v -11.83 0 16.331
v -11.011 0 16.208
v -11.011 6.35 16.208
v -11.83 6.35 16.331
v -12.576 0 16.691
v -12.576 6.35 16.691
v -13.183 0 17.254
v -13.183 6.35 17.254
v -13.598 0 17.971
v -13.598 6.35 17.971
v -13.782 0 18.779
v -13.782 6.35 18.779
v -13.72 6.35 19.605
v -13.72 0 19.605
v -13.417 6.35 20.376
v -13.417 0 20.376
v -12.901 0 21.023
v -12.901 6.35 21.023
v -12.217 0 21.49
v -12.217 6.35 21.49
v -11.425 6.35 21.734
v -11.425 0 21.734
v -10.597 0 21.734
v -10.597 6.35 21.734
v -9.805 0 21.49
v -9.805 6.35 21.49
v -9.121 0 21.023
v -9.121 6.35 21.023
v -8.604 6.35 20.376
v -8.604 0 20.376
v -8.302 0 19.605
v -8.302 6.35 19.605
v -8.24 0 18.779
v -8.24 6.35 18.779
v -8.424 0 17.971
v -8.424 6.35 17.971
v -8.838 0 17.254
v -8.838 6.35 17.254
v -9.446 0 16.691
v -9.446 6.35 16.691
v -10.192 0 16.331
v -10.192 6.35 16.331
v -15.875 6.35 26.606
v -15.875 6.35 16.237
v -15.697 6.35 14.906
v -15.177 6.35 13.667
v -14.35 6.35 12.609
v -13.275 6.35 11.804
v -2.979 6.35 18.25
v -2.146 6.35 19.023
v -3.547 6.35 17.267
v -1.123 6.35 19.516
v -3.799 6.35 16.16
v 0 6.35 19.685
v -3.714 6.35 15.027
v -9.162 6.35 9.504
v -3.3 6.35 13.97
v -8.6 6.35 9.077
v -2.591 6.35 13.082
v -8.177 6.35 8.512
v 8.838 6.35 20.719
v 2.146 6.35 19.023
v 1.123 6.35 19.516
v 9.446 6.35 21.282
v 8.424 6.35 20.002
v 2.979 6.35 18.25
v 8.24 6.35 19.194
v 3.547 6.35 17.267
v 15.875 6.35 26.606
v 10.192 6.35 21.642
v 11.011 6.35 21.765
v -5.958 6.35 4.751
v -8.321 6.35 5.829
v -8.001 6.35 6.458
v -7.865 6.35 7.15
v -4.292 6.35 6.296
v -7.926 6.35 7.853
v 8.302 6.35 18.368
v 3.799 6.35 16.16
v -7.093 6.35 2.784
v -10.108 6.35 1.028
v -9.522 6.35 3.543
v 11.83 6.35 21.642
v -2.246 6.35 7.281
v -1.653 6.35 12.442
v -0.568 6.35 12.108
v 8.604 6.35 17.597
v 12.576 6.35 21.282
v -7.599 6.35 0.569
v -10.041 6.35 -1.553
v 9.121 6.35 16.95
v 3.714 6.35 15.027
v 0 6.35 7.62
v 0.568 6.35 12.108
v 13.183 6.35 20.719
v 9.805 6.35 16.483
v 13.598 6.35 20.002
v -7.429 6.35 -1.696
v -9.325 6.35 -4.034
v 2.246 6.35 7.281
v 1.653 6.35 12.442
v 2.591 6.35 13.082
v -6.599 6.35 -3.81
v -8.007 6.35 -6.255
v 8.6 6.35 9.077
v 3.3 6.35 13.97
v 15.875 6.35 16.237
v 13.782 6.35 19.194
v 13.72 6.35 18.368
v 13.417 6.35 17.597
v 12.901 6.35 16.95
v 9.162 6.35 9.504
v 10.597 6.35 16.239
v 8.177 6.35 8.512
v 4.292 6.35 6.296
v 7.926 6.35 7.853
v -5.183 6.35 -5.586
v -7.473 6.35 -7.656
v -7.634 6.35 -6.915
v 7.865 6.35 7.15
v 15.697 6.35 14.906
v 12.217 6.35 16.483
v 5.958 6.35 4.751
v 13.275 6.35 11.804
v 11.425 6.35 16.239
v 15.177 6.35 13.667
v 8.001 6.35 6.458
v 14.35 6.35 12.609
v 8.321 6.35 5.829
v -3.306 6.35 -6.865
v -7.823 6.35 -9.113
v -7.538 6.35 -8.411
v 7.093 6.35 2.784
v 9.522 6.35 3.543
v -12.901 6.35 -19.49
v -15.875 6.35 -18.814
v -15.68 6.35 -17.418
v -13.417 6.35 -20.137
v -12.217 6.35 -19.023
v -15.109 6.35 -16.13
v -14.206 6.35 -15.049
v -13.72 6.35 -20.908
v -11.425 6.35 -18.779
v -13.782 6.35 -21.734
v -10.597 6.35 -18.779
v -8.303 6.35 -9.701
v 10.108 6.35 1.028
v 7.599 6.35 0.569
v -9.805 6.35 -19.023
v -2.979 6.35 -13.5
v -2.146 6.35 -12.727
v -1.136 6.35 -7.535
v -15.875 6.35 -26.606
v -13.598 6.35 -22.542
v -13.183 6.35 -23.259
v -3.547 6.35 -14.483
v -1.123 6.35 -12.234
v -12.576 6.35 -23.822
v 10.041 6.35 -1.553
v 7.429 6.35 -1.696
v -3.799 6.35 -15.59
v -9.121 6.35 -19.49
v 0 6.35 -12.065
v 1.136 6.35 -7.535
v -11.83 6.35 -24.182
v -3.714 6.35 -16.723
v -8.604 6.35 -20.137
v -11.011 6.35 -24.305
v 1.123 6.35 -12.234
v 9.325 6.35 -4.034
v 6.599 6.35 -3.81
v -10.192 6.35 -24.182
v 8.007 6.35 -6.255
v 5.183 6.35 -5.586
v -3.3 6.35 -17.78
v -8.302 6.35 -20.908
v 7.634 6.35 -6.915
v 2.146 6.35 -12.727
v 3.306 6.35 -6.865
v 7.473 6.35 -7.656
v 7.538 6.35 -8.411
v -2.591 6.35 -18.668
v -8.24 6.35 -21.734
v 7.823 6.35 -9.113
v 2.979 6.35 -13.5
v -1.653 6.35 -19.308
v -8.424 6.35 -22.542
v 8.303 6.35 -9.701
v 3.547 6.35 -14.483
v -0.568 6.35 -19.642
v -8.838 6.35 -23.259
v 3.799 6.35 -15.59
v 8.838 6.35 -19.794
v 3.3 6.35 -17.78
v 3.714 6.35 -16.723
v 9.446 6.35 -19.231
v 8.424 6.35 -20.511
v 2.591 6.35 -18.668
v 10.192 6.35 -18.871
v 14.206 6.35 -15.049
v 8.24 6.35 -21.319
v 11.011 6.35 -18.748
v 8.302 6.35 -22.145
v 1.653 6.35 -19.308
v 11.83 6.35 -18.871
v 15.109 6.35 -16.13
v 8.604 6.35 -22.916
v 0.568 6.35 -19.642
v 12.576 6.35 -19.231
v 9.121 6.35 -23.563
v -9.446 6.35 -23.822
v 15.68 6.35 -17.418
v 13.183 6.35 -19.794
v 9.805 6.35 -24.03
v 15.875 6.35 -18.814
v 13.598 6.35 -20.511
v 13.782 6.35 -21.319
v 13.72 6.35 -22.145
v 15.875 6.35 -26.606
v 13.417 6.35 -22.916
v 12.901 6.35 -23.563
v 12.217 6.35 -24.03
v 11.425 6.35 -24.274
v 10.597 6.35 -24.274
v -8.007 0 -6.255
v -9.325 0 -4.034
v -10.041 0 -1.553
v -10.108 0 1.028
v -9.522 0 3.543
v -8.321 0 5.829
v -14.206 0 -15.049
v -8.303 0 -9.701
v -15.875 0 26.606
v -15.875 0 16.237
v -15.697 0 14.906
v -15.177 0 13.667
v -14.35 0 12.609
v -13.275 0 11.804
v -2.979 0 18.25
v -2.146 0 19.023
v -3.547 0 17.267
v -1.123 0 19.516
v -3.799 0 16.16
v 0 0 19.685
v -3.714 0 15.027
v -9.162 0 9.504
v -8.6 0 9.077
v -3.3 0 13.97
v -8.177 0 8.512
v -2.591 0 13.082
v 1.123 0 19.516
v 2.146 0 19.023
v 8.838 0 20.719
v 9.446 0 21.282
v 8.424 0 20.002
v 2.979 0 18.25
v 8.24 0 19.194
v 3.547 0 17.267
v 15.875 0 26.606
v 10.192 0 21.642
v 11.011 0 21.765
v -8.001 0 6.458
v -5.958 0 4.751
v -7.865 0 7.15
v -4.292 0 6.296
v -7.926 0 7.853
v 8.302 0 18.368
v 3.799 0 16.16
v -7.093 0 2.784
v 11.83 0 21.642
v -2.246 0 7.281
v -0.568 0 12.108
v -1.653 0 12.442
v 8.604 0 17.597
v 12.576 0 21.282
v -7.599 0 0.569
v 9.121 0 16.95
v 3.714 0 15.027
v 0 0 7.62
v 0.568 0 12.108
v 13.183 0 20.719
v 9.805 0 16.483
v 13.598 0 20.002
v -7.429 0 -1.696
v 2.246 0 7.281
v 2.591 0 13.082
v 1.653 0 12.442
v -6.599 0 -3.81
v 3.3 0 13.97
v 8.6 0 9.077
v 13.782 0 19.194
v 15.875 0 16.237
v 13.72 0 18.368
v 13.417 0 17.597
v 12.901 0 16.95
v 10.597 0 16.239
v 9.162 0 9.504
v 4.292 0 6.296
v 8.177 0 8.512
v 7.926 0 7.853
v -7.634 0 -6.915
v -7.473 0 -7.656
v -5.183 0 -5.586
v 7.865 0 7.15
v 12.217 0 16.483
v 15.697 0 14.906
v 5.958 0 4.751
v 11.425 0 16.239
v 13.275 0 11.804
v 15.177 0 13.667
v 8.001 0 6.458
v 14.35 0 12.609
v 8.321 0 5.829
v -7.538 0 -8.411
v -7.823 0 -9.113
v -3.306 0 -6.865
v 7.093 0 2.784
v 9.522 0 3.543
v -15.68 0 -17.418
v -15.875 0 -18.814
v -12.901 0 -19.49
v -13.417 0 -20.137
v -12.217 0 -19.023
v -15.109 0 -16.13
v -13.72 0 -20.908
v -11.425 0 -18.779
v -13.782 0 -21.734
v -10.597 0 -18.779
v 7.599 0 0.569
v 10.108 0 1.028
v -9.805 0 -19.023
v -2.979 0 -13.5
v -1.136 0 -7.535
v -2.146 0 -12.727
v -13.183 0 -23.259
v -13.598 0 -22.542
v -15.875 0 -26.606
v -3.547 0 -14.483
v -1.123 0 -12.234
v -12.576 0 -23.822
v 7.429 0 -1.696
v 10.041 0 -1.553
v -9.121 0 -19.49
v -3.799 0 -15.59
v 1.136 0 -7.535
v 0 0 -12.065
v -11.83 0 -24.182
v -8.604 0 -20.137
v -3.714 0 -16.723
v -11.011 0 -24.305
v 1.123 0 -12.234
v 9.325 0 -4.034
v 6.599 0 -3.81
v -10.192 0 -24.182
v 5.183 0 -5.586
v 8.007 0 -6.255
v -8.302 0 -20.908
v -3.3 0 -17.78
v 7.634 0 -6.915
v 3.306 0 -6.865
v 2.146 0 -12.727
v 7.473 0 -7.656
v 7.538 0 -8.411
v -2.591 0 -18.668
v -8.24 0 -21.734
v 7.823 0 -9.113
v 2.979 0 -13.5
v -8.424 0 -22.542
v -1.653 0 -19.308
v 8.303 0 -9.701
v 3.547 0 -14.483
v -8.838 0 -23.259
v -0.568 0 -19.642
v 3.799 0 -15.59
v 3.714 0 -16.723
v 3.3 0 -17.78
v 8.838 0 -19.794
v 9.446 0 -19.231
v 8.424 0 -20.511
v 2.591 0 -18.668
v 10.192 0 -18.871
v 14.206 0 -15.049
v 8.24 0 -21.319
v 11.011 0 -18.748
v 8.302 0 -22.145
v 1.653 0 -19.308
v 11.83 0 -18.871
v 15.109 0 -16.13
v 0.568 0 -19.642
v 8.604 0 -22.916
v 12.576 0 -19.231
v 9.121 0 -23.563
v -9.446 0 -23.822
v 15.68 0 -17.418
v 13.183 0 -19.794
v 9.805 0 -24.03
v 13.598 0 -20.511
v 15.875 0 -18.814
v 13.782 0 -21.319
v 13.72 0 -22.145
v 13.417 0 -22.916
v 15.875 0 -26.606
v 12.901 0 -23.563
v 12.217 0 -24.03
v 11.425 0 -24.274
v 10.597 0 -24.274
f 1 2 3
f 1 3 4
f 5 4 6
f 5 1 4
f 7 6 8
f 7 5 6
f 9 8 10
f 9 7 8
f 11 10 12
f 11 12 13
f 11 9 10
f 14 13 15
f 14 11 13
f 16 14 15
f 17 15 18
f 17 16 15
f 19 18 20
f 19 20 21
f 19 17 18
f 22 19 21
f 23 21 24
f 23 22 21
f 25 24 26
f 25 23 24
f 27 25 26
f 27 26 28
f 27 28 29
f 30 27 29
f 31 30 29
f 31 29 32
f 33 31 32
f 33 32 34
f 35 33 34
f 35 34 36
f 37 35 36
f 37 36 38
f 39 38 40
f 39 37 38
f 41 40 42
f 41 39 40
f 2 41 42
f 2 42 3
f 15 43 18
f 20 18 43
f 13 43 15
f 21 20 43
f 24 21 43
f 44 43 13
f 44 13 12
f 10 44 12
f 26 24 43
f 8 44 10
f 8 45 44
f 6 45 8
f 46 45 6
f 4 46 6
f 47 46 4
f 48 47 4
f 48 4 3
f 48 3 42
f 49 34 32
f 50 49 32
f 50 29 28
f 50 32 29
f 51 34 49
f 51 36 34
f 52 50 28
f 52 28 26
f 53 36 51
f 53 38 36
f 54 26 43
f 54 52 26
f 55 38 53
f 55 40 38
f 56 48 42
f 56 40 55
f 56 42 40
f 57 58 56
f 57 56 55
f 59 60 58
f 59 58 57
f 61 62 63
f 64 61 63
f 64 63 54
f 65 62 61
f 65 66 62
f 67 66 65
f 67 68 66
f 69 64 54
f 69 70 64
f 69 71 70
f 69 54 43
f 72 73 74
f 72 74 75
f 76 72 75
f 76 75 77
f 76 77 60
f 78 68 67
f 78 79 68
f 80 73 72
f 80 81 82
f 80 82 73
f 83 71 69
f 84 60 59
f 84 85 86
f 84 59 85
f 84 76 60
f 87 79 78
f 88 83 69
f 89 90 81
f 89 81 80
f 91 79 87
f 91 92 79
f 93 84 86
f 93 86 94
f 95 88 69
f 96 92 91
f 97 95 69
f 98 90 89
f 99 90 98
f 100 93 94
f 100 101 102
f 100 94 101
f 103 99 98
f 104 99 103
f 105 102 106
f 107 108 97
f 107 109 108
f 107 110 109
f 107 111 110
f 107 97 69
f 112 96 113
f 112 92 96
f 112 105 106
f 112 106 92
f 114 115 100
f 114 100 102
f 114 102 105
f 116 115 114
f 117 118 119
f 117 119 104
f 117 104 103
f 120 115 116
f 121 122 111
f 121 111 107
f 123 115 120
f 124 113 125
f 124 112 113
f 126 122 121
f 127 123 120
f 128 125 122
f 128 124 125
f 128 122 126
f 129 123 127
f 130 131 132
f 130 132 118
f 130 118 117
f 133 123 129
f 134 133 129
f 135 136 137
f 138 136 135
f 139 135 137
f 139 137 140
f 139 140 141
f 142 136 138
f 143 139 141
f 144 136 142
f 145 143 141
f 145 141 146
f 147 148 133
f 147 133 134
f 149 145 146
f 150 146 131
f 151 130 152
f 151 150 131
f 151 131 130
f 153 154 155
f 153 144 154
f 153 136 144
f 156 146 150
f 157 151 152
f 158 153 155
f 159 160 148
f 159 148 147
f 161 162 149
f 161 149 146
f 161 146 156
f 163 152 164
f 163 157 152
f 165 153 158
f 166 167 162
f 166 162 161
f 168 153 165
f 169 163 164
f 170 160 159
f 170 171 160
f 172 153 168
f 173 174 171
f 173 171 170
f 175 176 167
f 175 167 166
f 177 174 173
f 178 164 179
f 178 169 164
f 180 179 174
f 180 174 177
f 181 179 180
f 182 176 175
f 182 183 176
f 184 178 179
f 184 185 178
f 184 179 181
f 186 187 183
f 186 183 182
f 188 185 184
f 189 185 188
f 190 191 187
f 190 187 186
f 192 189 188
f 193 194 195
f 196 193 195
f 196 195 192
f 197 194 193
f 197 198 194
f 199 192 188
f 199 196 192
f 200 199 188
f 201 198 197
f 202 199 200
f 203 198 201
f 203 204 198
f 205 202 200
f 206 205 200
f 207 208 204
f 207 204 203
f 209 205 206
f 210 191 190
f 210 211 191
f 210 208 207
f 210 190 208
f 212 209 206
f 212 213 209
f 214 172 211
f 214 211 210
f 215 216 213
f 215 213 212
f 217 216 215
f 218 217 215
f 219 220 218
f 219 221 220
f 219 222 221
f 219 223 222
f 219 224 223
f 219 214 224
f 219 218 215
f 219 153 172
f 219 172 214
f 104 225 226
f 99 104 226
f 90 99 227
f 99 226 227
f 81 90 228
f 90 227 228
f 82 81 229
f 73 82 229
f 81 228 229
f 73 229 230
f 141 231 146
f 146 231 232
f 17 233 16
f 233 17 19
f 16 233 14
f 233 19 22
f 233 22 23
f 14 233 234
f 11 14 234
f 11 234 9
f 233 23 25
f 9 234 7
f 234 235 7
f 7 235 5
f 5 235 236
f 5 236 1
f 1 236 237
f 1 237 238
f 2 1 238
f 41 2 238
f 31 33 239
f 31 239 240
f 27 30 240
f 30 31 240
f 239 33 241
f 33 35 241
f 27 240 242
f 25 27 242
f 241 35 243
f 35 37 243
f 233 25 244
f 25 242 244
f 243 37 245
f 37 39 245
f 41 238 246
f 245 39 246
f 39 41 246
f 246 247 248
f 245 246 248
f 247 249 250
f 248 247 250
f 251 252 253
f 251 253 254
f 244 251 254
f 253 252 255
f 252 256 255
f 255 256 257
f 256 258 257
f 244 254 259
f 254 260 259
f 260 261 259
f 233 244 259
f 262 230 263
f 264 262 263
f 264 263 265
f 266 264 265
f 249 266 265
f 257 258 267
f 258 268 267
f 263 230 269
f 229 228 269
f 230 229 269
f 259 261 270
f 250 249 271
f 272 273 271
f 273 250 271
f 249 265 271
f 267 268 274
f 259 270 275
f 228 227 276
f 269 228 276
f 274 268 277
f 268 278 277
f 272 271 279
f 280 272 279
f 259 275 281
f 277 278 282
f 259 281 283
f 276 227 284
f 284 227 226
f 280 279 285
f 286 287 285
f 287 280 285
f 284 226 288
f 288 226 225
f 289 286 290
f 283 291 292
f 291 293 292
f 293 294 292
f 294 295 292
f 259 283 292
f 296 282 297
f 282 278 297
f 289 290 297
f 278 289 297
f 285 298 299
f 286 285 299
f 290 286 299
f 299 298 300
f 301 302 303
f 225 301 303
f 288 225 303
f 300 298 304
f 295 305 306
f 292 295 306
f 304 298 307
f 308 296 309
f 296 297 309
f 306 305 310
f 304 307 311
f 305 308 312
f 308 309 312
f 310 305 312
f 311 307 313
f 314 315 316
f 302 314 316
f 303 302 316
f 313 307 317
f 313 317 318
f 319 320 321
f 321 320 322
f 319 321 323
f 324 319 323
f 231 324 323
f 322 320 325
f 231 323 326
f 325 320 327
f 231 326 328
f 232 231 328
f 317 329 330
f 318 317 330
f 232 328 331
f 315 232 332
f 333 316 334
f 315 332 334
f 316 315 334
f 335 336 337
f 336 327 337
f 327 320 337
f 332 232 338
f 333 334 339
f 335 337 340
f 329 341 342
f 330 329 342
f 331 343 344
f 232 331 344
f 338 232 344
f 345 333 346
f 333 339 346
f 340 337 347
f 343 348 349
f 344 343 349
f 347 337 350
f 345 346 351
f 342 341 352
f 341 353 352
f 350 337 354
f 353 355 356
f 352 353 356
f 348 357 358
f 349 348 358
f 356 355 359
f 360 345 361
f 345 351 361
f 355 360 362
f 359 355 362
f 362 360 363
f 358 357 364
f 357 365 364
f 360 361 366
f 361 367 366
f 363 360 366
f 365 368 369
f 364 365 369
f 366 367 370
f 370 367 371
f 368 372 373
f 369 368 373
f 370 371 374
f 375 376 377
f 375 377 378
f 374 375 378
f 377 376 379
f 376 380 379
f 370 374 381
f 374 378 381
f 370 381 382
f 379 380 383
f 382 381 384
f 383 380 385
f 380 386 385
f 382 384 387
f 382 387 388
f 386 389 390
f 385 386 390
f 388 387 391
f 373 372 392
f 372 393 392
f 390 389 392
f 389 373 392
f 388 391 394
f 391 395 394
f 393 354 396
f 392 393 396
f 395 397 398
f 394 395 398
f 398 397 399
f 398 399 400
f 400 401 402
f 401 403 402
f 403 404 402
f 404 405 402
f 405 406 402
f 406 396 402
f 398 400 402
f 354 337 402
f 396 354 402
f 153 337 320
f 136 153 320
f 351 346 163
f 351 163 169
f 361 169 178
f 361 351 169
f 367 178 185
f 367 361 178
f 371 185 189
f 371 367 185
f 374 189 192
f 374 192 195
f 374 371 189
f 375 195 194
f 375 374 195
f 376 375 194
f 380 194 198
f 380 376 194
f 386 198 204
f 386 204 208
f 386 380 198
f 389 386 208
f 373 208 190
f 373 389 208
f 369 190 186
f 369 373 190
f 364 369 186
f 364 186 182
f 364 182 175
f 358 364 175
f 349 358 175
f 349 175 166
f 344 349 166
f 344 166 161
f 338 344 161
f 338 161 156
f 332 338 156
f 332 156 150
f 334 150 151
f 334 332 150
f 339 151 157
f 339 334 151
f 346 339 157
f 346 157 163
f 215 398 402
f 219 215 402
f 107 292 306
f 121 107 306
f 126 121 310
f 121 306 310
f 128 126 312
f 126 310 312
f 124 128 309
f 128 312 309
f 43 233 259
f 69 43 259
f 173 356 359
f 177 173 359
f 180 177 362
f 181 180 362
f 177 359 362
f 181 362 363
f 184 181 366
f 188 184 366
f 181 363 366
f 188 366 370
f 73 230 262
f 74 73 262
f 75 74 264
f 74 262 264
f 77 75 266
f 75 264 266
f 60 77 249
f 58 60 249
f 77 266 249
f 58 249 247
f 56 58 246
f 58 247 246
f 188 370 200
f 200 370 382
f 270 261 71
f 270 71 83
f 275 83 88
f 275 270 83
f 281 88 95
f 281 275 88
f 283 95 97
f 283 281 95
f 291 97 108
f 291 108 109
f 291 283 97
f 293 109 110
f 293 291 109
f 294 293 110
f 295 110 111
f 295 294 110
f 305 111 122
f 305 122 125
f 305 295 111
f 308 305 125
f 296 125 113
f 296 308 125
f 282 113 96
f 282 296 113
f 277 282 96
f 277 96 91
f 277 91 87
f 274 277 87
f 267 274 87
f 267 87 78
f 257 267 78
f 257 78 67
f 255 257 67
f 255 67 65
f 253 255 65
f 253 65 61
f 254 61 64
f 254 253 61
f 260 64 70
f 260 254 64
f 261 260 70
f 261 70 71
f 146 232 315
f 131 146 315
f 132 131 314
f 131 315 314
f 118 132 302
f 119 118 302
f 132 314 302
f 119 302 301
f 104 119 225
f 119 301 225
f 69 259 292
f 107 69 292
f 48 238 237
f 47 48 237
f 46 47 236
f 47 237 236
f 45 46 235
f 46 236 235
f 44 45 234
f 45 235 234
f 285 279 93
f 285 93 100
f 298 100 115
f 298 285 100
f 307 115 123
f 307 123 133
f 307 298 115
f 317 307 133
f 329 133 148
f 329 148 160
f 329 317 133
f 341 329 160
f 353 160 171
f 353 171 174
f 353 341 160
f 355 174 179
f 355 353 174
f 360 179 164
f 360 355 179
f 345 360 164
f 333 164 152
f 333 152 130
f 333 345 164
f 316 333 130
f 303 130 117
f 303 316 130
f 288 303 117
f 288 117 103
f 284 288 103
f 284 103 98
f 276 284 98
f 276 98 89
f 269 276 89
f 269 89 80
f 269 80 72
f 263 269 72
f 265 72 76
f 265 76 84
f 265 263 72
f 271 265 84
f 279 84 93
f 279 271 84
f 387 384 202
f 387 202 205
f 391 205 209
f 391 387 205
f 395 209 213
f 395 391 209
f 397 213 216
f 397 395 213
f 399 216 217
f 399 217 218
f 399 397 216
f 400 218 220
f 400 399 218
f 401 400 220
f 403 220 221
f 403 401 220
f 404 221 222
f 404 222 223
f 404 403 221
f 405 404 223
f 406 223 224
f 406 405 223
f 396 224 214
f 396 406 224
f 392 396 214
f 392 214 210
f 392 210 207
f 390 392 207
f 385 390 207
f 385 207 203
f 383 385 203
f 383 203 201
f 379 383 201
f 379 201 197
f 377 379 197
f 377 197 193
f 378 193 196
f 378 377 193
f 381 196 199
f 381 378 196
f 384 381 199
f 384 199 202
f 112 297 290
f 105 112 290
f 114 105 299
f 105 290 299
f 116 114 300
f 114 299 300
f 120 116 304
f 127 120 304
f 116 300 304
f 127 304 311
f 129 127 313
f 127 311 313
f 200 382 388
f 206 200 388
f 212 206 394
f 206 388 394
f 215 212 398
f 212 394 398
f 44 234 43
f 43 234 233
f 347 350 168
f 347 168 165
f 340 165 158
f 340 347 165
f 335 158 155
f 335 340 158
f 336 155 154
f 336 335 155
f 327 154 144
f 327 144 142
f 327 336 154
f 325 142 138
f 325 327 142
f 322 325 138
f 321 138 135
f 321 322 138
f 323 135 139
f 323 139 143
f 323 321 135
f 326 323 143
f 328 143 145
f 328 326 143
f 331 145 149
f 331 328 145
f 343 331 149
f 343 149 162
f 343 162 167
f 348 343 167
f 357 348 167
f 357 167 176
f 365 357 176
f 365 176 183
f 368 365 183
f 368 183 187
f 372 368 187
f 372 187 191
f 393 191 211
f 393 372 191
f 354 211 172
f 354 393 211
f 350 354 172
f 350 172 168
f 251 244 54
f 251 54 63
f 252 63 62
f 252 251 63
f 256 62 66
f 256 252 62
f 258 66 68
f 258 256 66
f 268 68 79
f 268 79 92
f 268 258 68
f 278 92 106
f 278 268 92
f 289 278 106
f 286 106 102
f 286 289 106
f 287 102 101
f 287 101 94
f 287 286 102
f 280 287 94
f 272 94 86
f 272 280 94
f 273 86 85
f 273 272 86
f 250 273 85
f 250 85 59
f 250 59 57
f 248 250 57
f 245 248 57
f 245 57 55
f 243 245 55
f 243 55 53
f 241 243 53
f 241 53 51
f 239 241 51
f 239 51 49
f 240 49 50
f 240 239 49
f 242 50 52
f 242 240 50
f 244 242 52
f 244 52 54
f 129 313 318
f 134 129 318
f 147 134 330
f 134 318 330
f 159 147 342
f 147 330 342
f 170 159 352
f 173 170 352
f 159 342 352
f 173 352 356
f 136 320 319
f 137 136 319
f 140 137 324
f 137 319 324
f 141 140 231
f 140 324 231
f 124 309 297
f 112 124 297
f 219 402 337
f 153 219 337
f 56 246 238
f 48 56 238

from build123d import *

# Parameters (mm, degrees)
SKETCH1_R           = 2.77876
SKETCH1_R_2         = 7.62
SKETCH1_R_3         = 3.81
BOSS_EXTRUDE1_DEPTH = 6.35


with BuildPart() as part:
    # Sketch1 → Boss-Extrude1 (new body)
    with BuildSketch(Plane(origin=(0, 0, 0), x_dir=(1, 0, 0), z_dir=(0, 1, 0))):
        with BuildLine():
            Line((-15.875, -26.6065), (15.875, -26.6065))
            Line((15.875, -26.6065), (15.875, -16.237330354))
            ThreePointArc((15.875, -16.237330354), (15.176911953, -13.667262721), (13.274508805, -11.803546858))
            Line((13.274508805, -11.803546858), (9.161857046, -9.503624849))
            ThreePointArc((9.161857046, -9.503624849), (7.9255795, -7.853183269), (8.321289158, -5.829386481))
            ThreePointArc((8.321289158, -5.829386481), (10.156557189, 0.264473195), (8.006627428, 6.254559715))
            ThreePointArc((8.006627428, 6.254559715), (7.477616777, 8.035735763), (8.302840532, 9.700501853))
            Line((8.302840532, 9.700501853), (14.205887505, 15.048906872))
            ThreePointArc((14.205887505, 15.048906872), (15.439012733, 16.75449557), (15.875, 18.81351129))
            Line((15.875, 18.81351129), (15.875, 26.6065))
            Line((15.875, 26.6065), (-15.875, 26.6065))
            Line((-15.875, 26.6065), (-15.875, 18.81351129))
            ThreePointArc((-15.875, 18.81351129), (-15.439012733, 16.75449557), (-14.205887505, 15.048906872))
            Line((-14.205887505, 15.048906872), (-8.302840532, 9.700501853))
            ThreePointArc((-8.302840532, 9.700501853), (-7.477616777, 8.035735763), (-8.006627428, 6.254559715))
            ThreePointArc((-8.006627428, 6.254559715), (-10.156557189, 0.264473195), (-8.321289158, -5.829386481))
            ThreePointArc((-8.321289158, -5.829386481), (-7.9255795, -7.853183269), (-9.161857046, -9.503624849))
            Line((-9.161857046, -9.503624849), (-13.274508805, -11.803546858))
            ThreePointArc((-13.274508805, -11.803546858), (-15.176911953, -13.667262721), (-15.875, -16.237330354))
            Line((-15.875, -16.237330354), (-15.875, -26.6065))
        make_face()
        with Locations(Location((11.0109, 21.5265, 0), (0, 0, 270))):
            Circle(SKETCH1_R, mode=Mode.SUBTRACT)
        with Locations(Location((11.0109, -18.9865, 0), (0, 0, 270))):
            Circle(SKETCH1_R, mode=Mode.SUBTRACT)
        with Locations(Location((-11.0109, -18.9865, 0), (0, 0, 90))):
            Circle(SKETCH1_R, mode=Mode.SUBTRACT)
        with Locations(Location((-11.0109, 21.5265, 0), (0, 0, 90))):
            Circle(SKETCH1_R, mode=Mode.SUBTRACT)
        with Locations(Location((0, 0, 0), (0, 0, 270))):
            Circle(SKETCH1_R_2, mode=Mode.SUBTRACT)
        with Locations(Location((0, 15.875, 0), (0, 0, 270))):
            Circle(SKETCH1_R_3, mode=Mode.SUBTRACT)
        with Locations(Location((0, -15.875, 0), (0, 0, 270))):
            Circle(SKETCH1_R_3, mode=Mode.SUBTRACT)
    extrude(amount=BOSS_EXTRUDE1_DEPTH)


solid = part.part
